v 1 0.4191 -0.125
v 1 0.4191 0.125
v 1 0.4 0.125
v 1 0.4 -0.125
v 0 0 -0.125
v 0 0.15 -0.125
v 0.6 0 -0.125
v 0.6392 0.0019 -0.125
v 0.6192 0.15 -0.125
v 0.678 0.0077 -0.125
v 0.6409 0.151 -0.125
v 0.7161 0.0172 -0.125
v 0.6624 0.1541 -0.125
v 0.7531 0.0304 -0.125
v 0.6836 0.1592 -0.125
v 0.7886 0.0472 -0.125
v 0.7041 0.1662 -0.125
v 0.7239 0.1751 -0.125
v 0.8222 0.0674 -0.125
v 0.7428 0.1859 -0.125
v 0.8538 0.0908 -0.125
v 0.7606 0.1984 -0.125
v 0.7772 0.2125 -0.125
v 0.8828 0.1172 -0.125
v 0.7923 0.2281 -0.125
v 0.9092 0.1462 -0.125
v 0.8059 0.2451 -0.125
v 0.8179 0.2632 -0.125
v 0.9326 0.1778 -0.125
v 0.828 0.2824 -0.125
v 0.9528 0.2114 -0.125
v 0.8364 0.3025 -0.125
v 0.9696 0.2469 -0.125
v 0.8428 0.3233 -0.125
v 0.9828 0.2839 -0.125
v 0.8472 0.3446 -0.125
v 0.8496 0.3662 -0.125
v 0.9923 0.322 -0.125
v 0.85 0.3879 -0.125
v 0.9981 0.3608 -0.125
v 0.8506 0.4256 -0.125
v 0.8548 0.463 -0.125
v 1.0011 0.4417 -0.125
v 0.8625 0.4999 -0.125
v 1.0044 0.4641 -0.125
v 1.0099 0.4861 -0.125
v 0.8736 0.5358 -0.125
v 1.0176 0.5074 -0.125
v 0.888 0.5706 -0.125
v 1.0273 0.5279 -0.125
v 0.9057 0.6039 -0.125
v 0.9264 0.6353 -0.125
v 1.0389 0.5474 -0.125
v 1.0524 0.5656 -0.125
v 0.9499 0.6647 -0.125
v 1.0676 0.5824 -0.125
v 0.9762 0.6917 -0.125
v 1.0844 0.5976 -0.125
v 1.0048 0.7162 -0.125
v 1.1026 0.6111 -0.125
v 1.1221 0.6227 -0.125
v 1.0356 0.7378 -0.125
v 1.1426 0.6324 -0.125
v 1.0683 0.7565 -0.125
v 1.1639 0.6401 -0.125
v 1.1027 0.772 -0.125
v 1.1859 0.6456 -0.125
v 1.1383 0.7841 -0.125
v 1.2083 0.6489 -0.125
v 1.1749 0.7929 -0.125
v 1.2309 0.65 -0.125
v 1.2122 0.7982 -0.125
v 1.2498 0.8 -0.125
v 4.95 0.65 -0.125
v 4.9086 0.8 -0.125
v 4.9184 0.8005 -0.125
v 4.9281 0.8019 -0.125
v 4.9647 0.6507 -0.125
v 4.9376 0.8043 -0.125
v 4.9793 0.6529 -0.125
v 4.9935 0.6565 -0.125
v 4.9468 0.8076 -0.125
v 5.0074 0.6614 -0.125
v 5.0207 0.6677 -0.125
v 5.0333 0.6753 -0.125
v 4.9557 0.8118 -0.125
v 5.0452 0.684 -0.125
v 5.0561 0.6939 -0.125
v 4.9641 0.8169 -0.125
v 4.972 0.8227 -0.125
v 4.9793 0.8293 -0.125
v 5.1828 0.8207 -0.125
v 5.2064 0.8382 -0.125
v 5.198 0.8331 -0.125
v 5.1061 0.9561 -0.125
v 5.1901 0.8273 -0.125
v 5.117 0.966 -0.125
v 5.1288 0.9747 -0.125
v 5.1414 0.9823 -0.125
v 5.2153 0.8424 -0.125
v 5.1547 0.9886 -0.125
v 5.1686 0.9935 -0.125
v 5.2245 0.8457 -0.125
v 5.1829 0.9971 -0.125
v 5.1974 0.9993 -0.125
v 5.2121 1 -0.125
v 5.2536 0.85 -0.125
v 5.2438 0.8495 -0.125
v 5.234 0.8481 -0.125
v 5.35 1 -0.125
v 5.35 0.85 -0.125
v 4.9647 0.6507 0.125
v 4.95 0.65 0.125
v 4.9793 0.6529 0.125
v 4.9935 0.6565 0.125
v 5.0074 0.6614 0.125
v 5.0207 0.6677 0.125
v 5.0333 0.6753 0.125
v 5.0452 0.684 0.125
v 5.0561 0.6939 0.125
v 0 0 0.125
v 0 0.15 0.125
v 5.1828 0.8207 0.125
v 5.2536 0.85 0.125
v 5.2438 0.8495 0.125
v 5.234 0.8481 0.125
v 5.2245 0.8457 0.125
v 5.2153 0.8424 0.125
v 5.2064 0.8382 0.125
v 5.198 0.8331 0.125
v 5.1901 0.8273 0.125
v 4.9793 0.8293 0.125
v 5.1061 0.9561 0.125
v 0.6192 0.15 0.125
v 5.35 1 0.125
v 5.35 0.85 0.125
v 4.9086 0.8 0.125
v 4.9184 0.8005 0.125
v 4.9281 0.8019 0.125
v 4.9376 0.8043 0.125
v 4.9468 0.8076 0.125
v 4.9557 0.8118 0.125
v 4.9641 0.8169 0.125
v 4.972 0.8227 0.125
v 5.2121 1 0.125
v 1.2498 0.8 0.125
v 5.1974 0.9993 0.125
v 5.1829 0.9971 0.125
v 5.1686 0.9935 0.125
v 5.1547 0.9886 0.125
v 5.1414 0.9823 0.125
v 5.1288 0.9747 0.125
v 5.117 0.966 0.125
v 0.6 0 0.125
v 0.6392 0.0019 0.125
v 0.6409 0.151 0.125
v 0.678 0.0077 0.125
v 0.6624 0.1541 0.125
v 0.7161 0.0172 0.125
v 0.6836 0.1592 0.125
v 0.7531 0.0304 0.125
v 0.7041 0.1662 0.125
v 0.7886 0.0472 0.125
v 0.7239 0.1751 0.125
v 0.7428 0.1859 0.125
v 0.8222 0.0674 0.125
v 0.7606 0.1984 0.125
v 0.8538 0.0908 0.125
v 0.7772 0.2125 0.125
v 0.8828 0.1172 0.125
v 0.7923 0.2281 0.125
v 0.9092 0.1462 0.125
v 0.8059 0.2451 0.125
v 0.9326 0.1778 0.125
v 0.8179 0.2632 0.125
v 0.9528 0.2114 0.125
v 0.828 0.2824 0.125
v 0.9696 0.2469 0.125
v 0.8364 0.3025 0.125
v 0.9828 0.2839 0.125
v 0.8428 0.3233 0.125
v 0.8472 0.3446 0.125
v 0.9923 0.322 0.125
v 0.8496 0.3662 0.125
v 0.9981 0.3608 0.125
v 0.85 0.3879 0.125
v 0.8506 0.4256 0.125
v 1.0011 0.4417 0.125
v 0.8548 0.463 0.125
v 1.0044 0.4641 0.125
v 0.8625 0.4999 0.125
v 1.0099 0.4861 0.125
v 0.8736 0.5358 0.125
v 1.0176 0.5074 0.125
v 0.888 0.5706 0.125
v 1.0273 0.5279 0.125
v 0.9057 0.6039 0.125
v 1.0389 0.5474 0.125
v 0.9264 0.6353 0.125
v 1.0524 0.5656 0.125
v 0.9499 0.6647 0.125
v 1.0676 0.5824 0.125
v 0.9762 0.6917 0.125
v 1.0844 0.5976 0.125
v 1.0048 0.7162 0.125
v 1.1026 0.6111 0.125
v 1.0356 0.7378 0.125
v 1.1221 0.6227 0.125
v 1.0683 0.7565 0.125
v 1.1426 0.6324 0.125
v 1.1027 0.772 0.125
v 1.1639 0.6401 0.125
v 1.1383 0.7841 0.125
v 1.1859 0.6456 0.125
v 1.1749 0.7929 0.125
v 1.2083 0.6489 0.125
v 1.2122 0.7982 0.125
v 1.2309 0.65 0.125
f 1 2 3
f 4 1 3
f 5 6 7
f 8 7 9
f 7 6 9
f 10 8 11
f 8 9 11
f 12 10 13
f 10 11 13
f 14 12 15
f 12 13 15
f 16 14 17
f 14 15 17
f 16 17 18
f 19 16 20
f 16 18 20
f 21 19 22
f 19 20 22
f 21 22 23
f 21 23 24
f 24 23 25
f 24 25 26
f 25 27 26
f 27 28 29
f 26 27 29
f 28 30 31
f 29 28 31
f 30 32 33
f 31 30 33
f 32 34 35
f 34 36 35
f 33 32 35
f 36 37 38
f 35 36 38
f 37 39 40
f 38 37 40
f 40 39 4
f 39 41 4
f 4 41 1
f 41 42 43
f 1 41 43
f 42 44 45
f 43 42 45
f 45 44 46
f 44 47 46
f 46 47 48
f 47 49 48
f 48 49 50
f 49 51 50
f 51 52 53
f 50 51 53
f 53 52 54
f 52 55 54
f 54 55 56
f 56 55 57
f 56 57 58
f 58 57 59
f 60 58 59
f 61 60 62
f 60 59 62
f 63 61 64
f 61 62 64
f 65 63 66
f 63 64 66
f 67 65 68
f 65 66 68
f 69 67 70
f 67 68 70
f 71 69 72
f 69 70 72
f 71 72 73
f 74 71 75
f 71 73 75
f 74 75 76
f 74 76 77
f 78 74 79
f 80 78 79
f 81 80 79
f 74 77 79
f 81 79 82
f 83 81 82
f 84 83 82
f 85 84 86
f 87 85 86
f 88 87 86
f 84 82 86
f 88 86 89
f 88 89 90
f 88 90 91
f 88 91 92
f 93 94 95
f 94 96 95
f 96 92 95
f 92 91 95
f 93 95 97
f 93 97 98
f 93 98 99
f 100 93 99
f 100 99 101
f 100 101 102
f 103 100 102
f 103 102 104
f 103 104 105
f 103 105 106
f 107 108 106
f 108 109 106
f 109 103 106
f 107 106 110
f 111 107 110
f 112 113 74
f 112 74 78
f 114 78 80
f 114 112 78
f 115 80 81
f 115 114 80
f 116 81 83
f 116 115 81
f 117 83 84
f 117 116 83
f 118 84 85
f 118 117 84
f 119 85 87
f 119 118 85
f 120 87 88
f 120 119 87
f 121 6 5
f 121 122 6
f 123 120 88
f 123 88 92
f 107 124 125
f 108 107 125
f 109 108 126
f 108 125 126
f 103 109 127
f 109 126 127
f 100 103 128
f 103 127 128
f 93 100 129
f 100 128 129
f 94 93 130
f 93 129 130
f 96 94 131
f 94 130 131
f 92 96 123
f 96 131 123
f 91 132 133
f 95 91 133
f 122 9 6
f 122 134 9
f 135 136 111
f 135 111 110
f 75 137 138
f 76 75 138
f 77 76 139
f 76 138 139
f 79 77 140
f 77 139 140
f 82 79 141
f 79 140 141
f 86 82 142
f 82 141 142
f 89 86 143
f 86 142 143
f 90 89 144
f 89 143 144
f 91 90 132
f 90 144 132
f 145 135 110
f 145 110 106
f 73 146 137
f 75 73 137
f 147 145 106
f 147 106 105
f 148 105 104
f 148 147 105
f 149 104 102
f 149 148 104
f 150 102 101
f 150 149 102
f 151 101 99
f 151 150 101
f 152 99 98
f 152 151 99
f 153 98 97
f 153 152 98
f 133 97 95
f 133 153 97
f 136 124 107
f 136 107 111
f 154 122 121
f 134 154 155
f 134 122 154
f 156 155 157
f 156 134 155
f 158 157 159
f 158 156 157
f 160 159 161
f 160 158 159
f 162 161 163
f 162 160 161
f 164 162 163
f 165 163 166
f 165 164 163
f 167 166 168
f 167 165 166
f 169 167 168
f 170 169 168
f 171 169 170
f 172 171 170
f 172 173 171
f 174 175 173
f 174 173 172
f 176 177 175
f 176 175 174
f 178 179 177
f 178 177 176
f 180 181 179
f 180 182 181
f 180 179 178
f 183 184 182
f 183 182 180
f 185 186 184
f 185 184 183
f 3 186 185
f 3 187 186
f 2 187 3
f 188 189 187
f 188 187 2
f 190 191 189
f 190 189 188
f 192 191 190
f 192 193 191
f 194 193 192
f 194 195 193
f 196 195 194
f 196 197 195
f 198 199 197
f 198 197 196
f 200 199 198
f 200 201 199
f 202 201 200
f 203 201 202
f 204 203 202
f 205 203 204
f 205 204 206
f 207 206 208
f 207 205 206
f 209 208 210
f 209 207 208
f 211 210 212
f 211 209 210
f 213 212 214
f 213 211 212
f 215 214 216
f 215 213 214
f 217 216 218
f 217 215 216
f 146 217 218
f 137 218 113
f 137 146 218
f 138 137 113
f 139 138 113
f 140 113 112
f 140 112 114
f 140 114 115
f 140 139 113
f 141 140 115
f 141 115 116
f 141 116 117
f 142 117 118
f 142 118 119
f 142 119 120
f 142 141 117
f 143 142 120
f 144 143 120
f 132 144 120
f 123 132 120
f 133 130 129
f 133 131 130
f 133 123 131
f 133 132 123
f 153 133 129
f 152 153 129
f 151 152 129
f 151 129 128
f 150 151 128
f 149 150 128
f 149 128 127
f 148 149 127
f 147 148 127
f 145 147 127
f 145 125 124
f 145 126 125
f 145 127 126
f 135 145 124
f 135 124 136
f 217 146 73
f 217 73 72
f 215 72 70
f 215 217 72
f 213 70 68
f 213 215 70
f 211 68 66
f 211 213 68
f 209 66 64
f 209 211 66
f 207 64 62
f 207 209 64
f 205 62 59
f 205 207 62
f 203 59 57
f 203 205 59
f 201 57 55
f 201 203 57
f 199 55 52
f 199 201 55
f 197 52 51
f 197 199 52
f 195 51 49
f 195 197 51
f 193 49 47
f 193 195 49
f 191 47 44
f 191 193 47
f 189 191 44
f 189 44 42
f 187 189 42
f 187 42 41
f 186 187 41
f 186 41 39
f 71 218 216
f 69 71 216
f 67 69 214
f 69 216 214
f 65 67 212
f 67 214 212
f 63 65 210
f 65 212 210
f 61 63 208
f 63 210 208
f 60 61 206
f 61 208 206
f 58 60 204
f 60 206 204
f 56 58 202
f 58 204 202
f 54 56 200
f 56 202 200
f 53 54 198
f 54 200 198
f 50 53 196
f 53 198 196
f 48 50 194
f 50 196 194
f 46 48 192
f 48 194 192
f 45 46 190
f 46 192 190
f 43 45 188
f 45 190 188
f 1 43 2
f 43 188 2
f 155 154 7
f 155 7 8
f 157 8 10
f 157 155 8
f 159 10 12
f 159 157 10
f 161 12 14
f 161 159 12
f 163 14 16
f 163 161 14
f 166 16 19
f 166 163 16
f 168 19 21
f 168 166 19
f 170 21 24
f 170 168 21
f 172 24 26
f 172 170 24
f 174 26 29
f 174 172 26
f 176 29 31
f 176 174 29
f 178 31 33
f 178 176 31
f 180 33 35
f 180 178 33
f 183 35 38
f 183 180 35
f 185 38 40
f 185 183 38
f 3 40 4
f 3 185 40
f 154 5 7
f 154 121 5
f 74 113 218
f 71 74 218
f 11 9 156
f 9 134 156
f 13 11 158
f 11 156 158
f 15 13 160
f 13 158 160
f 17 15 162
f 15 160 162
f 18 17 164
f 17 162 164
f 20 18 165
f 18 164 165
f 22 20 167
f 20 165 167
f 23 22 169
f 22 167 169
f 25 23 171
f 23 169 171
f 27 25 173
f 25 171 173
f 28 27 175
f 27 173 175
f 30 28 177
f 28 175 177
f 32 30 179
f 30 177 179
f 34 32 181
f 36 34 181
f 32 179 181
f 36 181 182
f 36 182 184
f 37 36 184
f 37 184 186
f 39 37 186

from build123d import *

# Parameters (mm, degrees)
PAD_DEPTH = 0.125


with BuildPart() as part:
    # Sketch → Pad (new body, symmetric)
    with BuildSketch(Plane.XY):
        with BuildLine():
            Line((0, 0), (0.6, 0))
            ThreePointArc((0.6, 0), (0.882843, 0.117157), (1, 0.4))
            Line((1, 0.419076), (1, 0.4))
            ThreePointArc((1.230924, 0.65), (1.067636, 0.582364), (1, 0.419076))
            Line((4.95, 0.65), (1.230924, 0.65))
            ThreePointArc((4.95, 0.65), (5.007403, 0.661418), (5.056066, 0.693934))
            Line((5.056066, 0.693934), (5.182843, 0.820711))
            ThreePointArc((5.253553, 0.85), (5.215285, 0.842388), (5.182843, 0.820711))
            Line((5.253553, 0.85), (5.35, 0.85))
            Line((5.35, 0.85), (5.35, 1))
            Line((5.35, 1), (5.212132, 1))
            ThreePointArc((5.212132, 1), (5.15473, 0.988582), (5.106066, 0.956066))
            Line((4.979289, 0.829289), (5.106066, 0.956066))
            ThreePointArc((4.908579, 0.8), (4.946847, 0.807612), (4.979289, 0.829289))
            Line((1.249817, 0.8), (4.908579, 0.8))
            ThreePointArc((1.249817, 0.8), (0.96273, 0.678534), (0.85, 0.387906))
            ThreePointArc((0.619181, 0.15), (0.78492, 0.220124), (0.85, 0.387906))
            Line((0.619181, 0.15), (0, 0.15))
            Line((0, 0.15), (0, 0))
        make_face()
    extrude(amount=PAD_DEPTH, both=True)


solid = part.part
